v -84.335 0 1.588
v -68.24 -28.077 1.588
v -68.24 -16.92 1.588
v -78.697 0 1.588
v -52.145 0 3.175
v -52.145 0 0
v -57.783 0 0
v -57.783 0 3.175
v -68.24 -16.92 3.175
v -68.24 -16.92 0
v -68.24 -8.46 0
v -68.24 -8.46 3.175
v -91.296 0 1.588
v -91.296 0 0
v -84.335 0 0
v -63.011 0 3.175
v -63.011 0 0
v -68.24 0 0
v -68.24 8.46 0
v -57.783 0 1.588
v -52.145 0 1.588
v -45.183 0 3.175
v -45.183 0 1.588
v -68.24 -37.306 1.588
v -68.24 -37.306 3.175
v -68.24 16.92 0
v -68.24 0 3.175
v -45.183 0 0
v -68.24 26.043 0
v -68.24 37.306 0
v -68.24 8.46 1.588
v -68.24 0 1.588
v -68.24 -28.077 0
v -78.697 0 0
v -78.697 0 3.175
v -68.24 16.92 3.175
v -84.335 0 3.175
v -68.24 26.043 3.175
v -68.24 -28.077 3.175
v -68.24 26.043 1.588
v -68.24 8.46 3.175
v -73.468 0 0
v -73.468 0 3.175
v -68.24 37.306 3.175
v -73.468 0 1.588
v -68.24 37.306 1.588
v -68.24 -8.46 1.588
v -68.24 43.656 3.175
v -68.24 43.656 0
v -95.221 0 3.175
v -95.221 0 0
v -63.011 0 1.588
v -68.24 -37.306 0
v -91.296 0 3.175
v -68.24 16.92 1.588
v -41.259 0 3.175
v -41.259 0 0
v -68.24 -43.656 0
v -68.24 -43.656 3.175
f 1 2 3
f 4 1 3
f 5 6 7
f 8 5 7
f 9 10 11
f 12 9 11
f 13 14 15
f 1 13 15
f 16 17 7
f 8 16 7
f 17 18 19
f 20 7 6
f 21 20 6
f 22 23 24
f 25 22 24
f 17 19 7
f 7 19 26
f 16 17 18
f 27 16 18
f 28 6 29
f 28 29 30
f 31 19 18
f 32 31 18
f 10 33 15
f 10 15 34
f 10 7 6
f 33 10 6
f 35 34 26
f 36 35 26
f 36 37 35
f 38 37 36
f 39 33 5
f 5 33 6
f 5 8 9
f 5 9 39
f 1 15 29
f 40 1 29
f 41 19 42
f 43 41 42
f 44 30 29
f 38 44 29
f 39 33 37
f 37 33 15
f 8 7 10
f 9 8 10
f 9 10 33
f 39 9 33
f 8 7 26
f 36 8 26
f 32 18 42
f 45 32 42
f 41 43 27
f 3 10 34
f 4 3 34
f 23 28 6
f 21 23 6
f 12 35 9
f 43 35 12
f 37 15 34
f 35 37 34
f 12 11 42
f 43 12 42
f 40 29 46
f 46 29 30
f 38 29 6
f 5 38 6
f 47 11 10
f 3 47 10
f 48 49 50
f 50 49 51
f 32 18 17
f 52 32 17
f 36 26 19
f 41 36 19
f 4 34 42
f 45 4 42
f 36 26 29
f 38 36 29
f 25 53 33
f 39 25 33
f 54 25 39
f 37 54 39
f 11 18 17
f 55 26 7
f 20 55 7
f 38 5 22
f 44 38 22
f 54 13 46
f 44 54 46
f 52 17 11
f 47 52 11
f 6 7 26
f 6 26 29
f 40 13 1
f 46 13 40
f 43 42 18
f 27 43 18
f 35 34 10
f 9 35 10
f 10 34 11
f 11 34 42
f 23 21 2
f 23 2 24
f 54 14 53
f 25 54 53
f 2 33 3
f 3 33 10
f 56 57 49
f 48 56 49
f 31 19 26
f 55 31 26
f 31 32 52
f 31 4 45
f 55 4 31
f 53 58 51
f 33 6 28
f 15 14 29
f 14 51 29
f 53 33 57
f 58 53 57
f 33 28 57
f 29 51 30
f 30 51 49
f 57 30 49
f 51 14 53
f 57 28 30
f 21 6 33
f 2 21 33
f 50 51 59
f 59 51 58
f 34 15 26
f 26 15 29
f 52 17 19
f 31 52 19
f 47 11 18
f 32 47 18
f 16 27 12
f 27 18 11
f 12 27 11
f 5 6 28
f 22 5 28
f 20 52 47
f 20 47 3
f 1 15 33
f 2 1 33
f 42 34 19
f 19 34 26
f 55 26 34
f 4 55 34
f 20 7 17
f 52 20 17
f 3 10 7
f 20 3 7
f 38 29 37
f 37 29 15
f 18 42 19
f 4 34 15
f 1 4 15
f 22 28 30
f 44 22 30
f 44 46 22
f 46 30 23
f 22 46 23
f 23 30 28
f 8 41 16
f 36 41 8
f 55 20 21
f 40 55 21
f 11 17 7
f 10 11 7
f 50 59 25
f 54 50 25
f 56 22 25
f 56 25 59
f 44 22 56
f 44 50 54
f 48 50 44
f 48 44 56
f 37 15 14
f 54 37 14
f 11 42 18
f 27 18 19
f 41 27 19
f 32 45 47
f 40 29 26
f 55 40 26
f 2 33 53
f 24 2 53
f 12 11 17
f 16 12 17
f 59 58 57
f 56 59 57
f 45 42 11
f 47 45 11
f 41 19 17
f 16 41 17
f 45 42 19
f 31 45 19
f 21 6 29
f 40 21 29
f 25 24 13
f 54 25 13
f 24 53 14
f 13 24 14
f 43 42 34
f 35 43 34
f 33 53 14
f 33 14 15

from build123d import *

# Parameters (mm, degrees)
F1_DEPTH = 3.175
F2_DEPTH = 1.5875
F3_DEPTH = 3.175


with BuildPart() as f1:
    # F0 (on Top) → F1 (new body)
    with BuildSketch(Plane.XY):
        Polygon((-41.258705, 0), (-68.239839, 43.65625), (-95.220973, 0), (-68.239839, -43.65625), align=None)
        Polygon((-68.239839, 37.30625), (-45.18322, 0), (-68.239839, -37.30625), (-91.296444, 0), align=None, mode=Mode.SUBTRACT)
    extrude(amount=F1_DEPTH)

    # F0 (on Top) → F2 (join)
    with BuildSketch(Plane.XY):
        Polygon((-57.782953, 0), (-52.14454, 0), (-68.239839, 26.042655), (-68.239839, 16.919542), align=None)
        Polygon((-68.239839, 0), (-63.011396, 0), (-68.239839, 8.459771), align=None)
        Polygon((-68.239839, 8.459771), (-68.239839, 16.919542), (-78.696725, 0), (-73.468282, 0), align=None)
        Polygon((-68.239839, 26.042655), (-68.239839, 37.30625), (-91.296444, 0), (-84.335137, 0), align=None)
        Polygon((-84.335137, 0), (-68.239839, -28.076844), (-68.239839, -16.919542), (-78.696725, 0), align=None)
        Polygon((-73.468282, 0), (-68.239839, -8.459771), (-68.239839, 0), align=None)
        Polygon((-68.239839, -16.919542), (-57.782953, 0), (-63.011396, 0), (-68.239839, -8.459771), align=None)
        Polygon((-68.239839, -37.30625), (-45.18322, 0), (-52.14454, 0), (-68.239839, -28.076844), align=None)
    extrude(amount=F2_DEPTH)


with BuildPart() as f3:
    # F0 (on Top) → F3 (new body)
    with BuildSketch(Plane.XY):
        Polygon((-52.14454, 0), (-45.18322, 0), (-68.239839, 37.30625), (-68.239839, 26.042655), align=None)
        Polygon((-63.011396, 0), (-57.782953, 0), (-68.239839, 16.919542), (-68.239839, 8.459771), align=None)
        Polygon((-68.239839, 0), (-68.239839, 8.459771), (-73.468282, 0), align=None)
        Polygon((-68.239839, 16.919542), (-68.239839, 26.042655), (-84.335137, 0), (-78.696725, 0), align=None)
        Polygon((-91.296444, 0), (-68.239839, -37.30625), (-68.239839, -28.076844), (-84.335137, 0), align=None)
        Polygon((-78.696725, 0), (-68.239839, -16.919542), (-68.239839, -8.459771), (-73.468282, 0), align=None)
        Polygon((-68.239839, -8.459771), (-63.011396, 0), (-68.239839, 0), align=None)
        Polygon((-68.239839, -28.076844), (-52.14454, 0), (-57.782953, 0), (-68.239839, -16.919542), align=None)
    extrude(amount=F3_DEPTH)


solid = Compound([f1.part, f3.part])
